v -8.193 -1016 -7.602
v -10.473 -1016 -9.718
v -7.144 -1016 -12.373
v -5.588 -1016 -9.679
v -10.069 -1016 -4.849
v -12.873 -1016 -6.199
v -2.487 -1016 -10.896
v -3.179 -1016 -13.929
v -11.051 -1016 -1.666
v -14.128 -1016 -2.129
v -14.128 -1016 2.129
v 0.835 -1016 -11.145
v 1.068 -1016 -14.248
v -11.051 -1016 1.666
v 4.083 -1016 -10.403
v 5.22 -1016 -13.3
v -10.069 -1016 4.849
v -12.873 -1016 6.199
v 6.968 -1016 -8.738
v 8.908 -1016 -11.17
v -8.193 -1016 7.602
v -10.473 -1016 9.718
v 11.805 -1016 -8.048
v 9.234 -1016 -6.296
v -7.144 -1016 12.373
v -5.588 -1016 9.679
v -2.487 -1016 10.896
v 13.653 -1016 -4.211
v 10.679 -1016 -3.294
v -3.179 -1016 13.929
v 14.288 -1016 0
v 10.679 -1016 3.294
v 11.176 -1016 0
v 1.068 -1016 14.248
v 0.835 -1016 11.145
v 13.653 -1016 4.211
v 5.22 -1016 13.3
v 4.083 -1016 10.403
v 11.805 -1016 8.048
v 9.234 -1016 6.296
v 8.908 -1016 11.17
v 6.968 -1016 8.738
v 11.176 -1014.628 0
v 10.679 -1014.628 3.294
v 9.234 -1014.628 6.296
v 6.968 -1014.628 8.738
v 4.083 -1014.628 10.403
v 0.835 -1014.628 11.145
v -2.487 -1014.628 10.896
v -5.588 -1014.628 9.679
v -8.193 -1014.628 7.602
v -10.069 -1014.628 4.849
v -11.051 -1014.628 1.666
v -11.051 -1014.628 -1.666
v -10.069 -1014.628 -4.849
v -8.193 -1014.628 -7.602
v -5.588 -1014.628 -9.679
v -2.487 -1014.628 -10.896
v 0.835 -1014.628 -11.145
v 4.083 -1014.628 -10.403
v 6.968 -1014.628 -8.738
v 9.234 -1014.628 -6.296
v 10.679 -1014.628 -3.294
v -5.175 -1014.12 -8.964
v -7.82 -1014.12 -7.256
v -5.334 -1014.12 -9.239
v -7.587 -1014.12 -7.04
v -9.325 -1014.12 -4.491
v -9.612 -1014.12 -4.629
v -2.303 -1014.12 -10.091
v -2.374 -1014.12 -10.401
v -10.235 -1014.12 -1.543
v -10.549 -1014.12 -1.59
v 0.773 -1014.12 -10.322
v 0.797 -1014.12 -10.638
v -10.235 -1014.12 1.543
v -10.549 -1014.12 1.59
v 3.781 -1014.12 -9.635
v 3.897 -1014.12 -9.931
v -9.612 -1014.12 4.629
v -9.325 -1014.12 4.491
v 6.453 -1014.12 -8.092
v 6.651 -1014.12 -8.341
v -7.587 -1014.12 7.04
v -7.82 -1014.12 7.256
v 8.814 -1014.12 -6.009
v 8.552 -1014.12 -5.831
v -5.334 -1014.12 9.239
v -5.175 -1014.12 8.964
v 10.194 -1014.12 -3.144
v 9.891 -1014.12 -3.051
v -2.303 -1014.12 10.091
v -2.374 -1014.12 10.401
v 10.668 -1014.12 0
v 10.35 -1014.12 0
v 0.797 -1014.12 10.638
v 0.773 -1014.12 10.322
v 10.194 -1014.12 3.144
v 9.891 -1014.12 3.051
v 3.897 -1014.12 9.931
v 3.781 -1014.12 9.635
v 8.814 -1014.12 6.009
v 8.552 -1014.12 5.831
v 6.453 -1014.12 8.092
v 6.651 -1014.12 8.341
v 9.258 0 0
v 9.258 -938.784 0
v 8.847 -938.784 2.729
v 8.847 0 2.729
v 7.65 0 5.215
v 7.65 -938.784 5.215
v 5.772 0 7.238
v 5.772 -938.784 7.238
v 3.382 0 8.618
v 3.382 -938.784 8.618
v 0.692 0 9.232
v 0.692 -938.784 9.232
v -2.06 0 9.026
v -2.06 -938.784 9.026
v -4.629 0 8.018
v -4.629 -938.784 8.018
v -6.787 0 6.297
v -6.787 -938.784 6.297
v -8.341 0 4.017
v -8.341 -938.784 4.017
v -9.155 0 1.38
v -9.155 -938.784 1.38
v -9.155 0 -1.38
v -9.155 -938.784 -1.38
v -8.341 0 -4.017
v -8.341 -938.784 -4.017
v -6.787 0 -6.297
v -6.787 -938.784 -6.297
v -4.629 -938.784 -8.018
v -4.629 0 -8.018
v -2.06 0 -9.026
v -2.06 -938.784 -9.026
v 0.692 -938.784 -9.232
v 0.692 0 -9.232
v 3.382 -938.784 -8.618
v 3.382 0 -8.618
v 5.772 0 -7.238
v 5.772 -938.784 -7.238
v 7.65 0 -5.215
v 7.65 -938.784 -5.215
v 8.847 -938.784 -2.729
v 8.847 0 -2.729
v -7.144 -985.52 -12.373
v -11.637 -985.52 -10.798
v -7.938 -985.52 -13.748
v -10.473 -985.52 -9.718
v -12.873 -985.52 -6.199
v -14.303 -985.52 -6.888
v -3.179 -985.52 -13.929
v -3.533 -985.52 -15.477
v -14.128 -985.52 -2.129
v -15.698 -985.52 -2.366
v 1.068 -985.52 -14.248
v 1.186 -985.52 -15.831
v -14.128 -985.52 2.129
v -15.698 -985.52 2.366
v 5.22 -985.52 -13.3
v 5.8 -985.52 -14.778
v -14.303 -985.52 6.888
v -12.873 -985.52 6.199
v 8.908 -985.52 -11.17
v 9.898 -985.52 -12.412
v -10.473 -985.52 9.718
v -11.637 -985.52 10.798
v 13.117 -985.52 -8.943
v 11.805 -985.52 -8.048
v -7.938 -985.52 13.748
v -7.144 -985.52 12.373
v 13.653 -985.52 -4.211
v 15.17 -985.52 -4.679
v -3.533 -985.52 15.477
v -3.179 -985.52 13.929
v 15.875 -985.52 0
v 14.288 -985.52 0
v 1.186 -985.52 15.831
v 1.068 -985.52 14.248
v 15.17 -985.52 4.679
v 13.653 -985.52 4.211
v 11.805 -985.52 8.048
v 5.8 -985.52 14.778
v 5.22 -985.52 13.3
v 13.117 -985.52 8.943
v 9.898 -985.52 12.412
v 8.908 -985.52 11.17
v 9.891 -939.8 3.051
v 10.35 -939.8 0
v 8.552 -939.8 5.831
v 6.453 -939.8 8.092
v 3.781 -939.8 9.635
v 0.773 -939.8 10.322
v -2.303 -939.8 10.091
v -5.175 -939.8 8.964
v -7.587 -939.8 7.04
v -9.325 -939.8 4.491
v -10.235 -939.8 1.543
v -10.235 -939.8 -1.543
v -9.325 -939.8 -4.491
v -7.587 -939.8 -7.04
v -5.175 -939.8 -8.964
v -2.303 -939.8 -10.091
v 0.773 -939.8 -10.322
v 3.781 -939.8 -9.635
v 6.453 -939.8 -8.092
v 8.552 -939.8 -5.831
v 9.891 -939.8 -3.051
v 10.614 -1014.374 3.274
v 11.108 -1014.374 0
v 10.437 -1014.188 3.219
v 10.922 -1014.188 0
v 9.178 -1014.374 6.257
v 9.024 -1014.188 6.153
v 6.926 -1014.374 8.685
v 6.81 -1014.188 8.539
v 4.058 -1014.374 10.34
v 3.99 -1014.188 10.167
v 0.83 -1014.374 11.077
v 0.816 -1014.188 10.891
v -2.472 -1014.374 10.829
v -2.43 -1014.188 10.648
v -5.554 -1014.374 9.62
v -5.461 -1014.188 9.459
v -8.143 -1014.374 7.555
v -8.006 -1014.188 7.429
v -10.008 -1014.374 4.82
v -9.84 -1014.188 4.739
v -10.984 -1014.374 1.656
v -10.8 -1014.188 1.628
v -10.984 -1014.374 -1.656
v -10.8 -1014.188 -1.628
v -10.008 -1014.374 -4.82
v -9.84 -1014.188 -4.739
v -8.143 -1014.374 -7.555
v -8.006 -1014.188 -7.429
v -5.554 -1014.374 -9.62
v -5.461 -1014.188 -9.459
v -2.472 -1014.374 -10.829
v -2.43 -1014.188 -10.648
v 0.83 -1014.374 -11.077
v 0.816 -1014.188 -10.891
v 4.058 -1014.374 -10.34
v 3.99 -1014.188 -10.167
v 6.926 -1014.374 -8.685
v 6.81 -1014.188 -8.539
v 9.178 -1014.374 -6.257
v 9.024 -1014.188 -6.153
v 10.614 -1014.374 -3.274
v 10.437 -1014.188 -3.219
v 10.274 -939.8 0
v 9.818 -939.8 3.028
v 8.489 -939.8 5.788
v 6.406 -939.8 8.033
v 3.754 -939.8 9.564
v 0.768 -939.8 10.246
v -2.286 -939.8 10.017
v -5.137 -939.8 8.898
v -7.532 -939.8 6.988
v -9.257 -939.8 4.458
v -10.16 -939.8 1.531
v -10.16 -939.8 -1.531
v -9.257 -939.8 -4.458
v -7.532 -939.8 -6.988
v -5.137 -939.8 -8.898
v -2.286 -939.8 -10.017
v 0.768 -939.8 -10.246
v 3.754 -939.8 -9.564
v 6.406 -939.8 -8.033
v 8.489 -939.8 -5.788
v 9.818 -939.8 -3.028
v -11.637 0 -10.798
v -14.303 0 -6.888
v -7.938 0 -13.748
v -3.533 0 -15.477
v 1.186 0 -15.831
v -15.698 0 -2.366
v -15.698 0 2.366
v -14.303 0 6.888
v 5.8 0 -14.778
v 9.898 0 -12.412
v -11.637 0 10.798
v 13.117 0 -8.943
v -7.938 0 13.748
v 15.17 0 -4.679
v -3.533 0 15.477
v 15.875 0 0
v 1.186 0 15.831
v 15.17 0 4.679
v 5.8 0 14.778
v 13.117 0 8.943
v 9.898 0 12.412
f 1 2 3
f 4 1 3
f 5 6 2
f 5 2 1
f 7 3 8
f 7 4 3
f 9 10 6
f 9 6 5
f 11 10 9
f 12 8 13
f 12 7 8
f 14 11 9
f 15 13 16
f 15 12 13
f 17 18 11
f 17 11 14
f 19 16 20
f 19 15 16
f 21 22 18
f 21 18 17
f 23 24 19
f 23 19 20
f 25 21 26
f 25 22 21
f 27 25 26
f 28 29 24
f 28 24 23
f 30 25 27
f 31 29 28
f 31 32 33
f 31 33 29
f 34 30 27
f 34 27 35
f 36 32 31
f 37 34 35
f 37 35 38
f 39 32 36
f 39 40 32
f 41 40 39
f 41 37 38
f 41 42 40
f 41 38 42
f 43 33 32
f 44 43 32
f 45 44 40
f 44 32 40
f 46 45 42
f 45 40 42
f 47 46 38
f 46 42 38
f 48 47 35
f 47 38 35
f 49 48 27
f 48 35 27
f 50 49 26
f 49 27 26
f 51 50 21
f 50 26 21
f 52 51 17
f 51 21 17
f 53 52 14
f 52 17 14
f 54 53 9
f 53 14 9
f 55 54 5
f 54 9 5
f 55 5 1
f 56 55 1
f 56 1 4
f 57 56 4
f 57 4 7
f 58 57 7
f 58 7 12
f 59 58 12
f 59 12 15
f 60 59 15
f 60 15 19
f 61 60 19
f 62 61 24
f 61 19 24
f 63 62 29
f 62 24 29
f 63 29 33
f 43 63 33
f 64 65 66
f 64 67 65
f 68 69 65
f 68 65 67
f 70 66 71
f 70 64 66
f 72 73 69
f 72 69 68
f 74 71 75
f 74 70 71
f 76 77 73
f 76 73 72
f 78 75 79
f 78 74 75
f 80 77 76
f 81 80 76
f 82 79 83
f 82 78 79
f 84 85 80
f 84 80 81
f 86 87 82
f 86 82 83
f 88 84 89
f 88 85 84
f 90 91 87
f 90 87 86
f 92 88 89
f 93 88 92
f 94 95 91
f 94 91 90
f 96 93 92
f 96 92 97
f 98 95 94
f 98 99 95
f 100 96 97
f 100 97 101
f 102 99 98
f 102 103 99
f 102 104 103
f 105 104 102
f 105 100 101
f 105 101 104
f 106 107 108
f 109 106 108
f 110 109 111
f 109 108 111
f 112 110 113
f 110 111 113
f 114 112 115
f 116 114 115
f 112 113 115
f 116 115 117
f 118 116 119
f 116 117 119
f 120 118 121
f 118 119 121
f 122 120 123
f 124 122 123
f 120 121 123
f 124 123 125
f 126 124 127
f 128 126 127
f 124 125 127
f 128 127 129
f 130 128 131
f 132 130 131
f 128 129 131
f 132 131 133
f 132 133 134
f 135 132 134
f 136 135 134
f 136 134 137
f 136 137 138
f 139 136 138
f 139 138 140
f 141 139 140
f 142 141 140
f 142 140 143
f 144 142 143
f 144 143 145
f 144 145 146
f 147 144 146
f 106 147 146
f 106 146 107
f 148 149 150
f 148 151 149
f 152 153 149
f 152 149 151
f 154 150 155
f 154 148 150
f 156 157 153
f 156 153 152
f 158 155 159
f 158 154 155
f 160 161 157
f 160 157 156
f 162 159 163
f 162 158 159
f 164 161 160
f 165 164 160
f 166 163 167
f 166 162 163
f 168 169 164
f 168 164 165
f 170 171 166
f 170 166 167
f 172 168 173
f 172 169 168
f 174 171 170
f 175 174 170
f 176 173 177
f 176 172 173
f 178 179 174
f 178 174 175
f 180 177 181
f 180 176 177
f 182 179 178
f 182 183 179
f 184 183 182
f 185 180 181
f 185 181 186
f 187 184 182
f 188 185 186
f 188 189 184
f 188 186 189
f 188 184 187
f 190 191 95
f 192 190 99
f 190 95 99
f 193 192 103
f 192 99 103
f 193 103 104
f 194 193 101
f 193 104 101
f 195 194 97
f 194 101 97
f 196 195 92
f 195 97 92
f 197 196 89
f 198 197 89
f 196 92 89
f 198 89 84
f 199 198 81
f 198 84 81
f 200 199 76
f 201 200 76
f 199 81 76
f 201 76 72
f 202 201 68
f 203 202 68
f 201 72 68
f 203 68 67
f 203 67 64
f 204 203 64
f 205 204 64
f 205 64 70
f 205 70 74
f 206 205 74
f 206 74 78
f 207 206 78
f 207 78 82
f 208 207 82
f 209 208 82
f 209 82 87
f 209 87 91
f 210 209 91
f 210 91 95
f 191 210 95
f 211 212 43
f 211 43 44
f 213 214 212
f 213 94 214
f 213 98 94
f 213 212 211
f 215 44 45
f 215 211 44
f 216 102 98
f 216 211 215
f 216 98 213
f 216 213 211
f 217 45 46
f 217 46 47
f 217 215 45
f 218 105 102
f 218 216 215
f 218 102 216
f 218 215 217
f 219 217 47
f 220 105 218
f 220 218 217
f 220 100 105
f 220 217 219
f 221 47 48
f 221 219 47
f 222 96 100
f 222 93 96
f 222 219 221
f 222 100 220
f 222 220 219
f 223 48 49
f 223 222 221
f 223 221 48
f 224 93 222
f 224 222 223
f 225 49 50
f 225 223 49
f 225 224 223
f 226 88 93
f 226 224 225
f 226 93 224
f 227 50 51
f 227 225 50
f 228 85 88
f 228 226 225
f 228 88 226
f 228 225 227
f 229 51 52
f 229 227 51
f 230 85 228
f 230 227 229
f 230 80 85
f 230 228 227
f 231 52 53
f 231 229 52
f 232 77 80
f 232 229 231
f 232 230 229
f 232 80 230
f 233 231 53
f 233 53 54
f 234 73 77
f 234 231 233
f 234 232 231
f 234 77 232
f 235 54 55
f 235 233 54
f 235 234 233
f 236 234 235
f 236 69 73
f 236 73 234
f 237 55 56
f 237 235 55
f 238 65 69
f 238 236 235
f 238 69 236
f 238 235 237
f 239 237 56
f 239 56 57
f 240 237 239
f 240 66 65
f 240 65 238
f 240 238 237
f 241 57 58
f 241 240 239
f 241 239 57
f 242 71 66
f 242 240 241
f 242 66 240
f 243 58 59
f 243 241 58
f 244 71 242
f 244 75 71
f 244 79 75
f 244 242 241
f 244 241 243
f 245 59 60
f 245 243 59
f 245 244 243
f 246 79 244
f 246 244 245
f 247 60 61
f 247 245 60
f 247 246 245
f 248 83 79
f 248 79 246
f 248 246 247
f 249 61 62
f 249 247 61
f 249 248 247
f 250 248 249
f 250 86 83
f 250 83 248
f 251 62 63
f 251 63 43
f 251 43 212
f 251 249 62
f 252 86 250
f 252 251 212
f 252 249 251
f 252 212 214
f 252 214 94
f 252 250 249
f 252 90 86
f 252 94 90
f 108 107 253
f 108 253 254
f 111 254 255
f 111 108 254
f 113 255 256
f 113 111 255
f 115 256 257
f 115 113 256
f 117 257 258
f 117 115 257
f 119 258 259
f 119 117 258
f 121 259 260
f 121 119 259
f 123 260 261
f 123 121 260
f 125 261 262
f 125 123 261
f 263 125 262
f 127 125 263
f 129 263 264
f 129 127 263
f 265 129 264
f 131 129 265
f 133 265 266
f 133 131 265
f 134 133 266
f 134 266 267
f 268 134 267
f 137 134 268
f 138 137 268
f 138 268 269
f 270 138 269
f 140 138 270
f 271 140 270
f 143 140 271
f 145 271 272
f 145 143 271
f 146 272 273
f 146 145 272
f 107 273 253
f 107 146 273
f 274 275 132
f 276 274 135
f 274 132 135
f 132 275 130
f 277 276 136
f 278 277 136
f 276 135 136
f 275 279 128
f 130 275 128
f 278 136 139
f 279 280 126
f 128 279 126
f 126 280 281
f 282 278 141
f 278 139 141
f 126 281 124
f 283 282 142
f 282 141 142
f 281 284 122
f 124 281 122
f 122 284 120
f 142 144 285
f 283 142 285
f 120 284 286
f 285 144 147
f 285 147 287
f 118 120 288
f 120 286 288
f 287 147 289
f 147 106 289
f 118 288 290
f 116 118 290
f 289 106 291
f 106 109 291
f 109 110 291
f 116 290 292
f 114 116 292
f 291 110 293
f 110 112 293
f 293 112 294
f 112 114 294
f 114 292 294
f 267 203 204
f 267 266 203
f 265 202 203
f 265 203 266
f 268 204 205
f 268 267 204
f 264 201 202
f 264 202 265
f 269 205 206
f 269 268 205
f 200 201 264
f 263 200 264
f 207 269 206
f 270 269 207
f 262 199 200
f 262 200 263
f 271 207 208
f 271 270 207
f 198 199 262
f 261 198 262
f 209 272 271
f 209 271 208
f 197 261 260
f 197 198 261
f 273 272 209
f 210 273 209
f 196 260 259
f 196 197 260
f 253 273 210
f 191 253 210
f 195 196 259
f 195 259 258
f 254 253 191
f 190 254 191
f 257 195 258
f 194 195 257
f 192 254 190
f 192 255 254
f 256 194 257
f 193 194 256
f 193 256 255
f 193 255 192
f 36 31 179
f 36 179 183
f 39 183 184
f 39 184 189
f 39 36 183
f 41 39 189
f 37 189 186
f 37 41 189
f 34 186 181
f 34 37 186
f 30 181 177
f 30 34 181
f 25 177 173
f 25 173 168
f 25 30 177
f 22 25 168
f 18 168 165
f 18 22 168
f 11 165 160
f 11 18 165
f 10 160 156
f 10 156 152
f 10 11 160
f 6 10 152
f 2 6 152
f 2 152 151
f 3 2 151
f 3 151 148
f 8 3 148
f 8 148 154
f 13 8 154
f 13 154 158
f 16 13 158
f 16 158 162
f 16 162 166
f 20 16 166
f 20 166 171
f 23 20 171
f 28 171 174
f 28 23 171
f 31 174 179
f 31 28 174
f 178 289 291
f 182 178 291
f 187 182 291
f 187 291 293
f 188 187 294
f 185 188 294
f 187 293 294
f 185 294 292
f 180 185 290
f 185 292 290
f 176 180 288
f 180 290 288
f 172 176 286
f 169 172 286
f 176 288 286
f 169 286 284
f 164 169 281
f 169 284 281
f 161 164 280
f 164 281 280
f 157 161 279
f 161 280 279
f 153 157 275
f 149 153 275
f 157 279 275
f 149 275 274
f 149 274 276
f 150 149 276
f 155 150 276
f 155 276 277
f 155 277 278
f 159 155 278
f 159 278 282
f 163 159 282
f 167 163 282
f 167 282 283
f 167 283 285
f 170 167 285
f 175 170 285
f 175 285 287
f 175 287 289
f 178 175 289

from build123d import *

# Parameters (mm, degrees)
F0_R      = 15.875
F1_DEPTH  = 1016
F2_R      = 11.176
F3_DEPTH  = 1.8796
F4_R      = 10.3505
F5_DEPTH  = 76.2
F6_R      = 9.2583
F7_DEPTH  = 1016.001
F8_R      = 0.508
F9_R      = 15.875
F9_R_2    = 14.2875
F10_DEPTH = 30.48
F11_SIZE  = 1.016


with BuildPart() as f1:
    # F0 (on Front) → F1 (new body)
    with BuildSketch(Plane.XZ):
        Circle(F0_R)
    extrude(amount=F1_DEPTH)

    # F2 (on face) → F3 (cut)
    with BuildSketch(Plane.XZ.offset(1016)):
        Circle(F2_R)
    extrude(amount=-F3_DEPTH, mode=Mode.SUBTRACT)

    # F4 (on face) → F5 (cut)
    with BuildSketch(Plane.XZ.offset(1016)):
        Circle(F4_R)
    extrude(amount=-F5_DEPTH, mode=Mode.SUBTRACT)

    # F6 (on face) → F7 (cut, through all)
    with BuildSketch(Plane.XZ.offset(1016)):
        Circle(F6_R)
    extrude(amount=-F7_DEPTH, mode=Mode.SUBTRACT)

    # F8
    f8_edges = [f1.edges().sort_by_distance(p)[0] for p in [
        (-11.176, -1014.1204, 0),
    ]]
    fillet(f8_edges, radius=F8_R)

    # F9 (on face) → F10 (cut)
    with BuildSketch(Plane.XZ.offset(1016)):
        Circle(F9_R)
        Circle(F9_R_2, mode=Mode.SUBTRACT)
    extrude(amount=-F10_DEPTH, mode=Mode.SUBTRACT)

    # F11
    f11_edges = [f1.edges().sort_by_distance(p)[0] for p in [
        (-9.2583, -939.8, 0),
    ]]
    chamfer(f11_edges, length=F11_SIZE)


solid = f1.part
